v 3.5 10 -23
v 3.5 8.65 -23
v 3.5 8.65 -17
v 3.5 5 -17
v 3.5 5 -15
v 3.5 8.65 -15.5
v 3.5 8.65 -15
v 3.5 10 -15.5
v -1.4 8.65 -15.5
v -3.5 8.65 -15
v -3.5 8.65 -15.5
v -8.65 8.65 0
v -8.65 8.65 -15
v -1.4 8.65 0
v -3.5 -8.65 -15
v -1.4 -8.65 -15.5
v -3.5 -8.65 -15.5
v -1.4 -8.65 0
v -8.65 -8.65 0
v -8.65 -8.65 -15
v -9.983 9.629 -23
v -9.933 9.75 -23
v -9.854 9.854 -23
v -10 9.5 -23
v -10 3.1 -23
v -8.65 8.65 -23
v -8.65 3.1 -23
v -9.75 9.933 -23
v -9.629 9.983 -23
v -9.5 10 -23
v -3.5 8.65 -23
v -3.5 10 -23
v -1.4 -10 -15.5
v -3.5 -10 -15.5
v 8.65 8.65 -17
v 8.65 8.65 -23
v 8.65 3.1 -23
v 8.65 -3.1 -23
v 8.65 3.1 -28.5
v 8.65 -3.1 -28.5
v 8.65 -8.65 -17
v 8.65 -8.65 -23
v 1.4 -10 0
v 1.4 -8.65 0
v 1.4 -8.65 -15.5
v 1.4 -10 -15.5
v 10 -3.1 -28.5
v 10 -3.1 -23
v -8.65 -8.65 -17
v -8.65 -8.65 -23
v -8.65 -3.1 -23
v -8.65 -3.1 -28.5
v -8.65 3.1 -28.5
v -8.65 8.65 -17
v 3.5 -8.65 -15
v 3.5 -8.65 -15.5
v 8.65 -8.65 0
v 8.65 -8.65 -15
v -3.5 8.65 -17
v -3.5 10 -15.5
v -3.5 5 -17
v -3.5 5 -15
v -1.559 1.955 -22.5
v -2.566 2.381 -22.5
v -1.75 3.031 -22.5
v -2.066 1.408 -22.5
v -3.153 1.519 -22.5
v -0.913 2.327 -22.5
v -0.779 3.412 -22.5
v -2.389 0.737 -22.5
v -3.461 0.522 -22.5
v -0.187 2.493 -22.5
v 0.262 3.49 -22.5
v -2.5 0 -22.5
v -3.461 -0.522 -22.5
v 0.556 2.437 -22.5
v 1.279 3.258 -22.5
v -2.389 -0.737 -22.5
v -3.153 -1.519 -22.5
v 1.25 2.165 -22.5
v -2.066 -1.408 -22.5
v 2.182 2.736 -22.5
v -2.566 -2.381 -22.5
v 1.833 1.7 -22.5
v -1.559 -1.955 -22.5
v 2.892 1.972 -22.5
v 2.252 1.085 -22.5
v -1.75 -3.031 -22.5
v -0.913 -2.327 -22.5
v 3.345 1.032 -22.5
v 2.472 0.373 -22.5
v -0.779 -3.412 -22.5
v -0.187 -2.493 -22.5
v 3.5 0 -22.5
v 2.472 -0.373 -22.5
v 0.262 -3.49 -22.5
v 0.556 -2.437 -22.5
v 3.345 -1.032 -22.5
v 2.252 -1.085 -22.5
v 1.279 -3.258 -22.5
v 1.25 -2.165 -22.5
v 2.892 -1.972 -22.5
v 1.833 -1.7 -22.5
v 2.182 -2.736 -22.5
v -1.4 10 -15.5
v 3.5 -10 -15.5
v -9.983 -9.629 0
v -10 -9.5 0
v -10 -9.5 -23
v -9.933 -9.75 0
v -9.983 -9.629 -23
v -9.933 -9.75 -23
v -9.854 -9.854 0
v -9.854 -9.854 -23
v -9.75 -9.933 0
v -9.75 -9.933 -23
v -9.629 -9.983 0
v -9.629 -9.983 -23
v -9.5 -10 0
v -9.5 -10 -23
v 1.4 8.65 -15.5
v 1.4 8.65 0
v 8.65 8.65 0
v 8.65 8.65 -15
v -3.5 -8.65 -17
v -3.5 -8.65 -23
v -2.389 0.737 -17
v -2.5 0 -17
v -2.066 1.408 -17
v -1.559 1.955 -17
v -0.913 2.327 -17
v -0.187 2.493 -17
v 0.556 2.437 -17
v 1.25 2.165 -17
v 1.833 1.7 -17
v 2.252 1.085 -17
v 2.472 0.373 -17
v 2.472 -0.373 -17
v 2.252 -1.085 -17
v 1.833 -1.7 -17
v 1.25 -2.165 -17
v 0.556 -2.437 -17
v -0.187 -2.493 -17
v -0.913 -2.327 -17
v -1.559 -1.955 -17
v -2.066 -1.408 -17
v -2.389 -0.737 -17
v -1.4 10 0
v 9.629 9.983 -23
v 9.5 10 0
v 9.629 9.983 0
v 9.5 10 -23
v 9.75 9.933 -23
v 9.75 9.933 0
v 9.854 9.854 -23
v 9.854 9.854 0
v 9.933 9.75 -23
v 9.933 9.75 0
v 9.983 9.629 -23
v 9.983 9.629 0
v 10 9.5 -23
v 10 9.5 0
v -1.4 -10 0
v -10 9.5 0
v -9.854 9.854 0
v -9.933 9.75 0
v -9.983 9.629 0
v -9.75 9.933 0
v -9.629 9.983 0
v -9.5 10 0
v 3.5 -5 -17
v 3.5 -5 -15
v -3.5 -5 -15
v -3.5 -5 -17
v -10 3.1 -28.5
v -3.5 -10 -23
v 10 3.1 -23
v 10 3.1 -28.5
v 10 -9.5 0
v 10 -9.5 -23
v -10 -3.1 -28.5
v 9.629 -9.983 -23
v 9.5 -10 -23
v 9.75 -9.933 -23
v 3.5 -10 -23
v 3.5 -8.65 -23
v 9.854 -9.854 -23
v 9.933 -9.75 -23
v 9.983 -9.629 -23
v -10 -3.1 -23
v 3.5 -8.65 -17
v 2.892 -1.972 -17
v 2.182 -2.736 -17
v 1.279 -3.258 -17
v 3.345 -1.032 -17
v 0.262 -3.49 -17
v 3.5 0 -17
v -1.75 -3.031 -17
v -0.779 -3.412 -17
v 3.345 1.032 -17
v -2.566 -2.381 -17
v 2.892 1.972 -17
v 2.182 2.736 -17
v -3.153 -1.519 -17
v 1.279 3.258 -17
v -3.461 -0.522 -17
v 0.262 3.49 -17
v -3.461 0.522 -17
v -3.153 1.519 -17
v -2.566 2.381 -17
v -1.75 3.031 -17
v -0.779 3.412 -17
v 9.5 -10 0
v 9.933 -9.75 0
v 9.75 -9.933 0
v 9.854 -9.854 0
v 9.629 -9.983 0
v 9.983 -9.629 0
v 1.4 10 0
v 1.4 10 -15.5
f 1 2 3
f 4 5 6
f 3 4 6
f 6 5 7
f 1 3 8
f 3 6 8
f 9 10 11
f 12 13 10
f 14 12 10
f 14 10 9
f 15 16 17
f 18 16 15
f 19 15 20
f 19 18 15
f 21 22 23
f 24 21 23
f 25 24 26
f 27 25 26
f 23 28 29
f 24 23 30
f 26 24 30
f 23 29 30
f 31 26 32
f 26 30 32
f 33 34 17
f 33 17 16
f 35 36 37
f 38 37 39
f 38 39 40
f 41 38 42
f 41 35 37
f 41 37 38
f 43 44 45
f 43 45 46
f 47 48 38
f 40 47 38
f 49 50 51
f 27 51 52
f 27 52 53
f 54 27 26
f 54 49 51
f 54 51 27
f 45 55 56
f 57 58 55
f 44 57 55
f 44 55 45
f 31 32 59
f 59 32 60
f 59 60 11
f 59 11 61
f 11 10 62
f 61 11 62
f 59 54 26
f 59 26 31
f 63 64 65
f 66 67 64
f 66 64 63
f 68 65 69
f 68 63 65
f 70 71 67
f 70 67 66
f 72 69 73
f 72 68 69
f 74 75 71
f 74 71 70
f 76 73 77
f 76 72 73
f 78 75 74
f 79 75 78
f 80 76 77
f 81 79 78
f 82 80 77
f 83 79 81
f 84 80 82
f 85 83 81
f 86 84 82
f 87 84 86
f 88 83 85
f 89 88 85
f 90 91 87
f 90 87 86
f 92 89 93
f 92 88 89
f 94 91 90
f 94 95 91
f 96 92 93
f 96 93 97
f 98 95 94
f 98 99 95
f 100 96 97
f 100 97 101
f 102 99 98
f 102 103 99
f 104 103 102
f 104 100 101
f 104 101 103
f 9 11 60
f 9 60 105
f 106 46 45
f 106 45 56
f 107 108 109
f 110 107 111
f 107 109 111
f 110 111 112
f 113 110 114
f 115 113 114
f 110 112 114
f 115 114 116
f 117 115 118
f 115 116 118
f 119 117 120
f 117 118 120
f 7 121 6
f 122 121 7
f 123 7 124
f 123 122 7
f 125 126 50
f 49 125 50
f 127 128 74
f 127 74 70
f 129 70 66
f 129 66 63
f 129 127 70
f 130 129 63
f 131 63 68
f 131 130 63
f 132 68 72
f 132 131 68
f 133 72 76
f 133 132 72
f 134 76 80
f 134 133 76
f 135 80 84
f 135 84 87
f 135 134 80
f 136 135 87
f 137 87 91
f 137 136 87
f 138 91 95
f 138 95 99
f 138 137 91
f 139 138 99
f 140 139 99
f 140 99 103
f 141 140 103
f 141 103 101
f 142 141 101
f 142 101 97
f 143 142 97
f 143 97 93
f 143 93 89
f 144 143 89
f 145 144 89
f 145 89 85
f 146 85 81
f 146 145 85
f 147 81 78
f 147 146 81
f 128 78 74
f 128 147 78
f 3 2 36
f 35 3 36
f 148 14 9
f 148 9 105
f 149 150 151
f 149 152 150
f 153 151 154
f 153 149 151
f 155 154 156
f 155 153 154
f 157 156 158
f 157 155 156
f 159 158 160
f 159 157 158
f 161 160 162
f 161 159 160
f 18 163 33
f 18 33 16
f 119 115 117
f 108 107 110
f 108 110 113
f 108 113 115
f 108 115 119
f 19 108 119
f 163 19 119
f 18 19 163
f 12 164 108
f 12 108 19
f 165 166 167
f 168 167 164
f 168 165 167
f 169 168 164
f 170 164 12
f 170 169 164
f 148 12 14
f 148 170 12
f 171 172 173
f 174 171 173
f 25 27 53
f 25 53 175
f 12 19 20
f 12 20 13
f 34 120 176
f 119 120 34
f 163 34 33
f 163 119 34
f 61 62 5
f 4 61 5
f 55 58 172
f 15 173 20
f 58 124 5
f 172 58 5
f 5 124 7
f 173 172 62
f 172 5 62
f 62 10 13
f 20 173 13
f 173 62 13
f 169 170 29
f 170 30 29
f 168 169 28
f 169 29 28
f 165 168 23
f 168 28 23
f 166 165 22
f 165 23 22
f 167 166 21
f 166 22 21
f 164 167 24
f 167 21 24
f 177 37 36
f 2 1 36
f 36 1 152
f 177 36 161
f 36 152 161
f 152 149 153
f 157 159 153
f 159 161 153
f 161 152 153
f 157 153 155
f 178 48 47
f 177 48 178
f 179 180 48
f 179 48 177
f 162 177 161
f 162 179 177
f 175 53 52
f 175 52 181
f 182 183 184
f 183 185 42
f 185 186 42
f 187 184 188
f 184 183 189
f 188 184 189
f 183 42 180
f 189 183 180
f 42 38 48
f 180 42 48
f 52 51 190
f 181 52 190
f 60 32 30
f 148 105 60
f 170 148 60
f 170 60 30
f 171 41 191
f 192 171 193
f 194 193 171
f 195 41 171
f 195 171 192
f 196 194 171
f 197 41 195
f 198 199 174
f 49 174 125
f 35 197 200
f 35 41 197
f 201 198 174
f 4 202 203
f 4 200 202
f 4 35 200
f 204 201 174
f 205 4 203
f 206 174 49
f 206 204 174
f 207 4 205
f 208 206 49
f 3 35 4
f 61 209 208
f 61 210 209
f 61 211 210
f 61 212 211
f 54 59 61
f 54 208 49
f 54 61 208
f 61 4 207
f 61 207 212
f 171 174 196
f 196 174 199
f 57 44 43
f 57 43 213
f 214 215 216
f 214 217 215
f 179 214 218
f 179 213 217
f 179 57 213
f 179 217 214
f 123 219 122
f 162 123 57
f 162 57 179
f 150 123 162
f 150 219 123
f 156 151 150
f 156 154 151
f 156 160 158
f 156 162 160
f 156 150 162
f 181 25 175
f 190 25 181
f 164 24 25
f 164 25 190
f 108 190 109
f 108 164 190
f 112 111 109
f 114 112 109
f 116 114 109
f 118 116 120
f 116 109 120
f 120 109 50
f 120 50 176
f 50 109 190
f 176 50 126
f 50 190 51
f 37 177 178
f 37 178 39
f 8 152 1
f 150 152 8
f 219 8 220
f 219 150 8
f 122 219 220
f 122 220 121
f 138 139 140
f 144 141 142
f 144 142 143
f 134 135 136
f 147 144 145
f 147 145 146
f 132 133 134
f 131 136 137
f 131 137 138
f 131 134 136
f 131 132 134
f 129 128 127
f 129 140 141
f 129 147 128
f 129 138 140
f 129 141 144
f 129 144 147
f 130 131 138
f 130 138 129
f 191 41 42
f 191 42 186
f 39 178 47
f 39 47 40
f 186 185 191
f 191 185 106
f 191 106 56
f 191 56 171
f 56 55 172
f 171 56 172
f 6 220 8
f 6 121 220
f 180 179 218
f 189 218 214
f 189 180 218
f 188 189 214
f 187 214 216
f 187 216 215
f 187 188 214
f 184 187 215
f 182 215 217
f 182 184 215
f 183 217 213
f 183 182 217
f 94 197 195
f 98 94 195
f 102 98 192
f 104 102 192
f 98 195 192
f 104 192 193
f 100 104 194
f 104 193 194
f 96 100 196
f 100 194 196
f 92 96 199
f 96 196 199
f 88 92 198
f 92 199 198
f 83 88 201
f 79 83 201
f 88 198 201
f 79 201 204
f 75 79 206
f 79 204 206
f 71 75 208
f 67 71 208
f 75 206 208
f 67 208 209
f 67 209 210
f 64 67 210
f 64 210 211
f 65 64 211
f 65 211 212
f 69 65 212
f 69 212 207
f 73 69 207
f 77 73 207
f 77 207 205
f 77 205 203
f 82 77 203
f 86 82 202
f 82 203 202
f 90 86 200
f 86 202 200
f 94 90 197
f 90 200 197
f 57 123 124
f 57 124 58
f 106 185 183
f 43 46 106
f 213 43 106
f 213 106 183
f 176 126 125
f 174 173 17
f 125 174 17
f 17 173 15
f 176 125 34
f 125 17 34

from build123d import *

# Parameters (mm, degrees)
BOSS_EXTRUDE1_DEPTH      = 23
BOSS_EXTRUDE1_2_DEPTH    = 23
SKETCH2_W                = 7
SKETCH2_H                = 7.5
CUT_EXTRUDE1_DEPTH       = 22
BOSS_EXTRUDE2_DEPTH      = 1.5
BOSS_EXTRUDE2_DEPTH_BACK = 0.5
FILLET1_R                = 0.5
SKETCH4_R                = 3.5
SKETCH4_R_2              = 2.5
BOSS_EXTRUDE3_DEPTH      = 5.5
SKETCH5_W                = 1.35
SKETCH5_H                = 6.2
BOSS_EXTRUDE4_DEPTH      = 5.5


with BuildPart() as part:
    # Sketch1 → Boss-Extrude1 (new body)
    with BuildSketch(Plane.XY):
        Polygon((-8.65, 8.65), (-1.4, 8.65), (-1.4, 10), (-10, 10), (-10, -10), (-1.4, -10), (-1.4, -8.65), (-8.65, -8.65), align=None)
    extrude(amount=-BOSS_EXTRUDE1_DEPTH)


with BuildPart() as body_2:
    # Sketch1 → Boss-Extrude1 2 (new body)
    with BuildSketch(Plane.XY):
        Polygon((10, -10), (10, 10), (1.4, 10), (1.4, 8.65), (8.65, 8.65), (8.65, -8.65), (1.4, -8.65), (1.4, -10), align=None)
    extrude(amount=-BOSS_EXTRUDE1_2_DEPTH)


with BuildPart() as cut_extrude1_tool:
    # Sketch2 → Cut-Extrude1 (new body)
    with BuildSketch(Plane.XZ.offset(10)):
        with Locations((0, -19.25)):
            Rectangle(SKETCH2_W, SKETCH2_H)
    extrude(amount=-CUT_EXTRUDE1_DEPTH)


with BuildPart() as part_1:
    add(part.part)

    # Cut-Extrude1: cut by cut_extrude1_tool
    add(cut_extrude1_tool.part, mode=Mode.SUBTRACT)



with BuildPart() as body_2_1:
    add(body_2.part)

    # Cut-Extrude1: cut by cut_extrude1_tool
    add(cut_extrude1_tool.part, mode=Mode.SUBTRACT)


with BuildPart() as part_2:
    add(part_1.part)

    add(body_2_1.part)  # Boss-Extrude2 merges body 2
    # Sketch3 → Boss-Extrude2 (add, two sides: drawn at the far end of the back side and taken through both)
    with BuildSketch(Plane(origin=(0, 0, -15.5), x_dir=(-1, 0, 0), z_dir=(0, 0, -1)).offset(-BOSS_EXTRUDE2_DEPTH_BACK)):
        Polygon((8.65, 8.65), (3.5, 8.65), (3.5, 5), (-3.5, 5), (-3.5, 8.65), (-8.65, 8.65), (-8.65, -8.65), (-3.5, -8.65), (-3.5, -5), (3.5, -5), (3.5, -8.65), (8.65, -8.65), align=None)
    extrude(amount=BOSS_EXTRUDE2_DEPTH + BOSS_EXTRUDE2_DEPTH_BACK)

    # Fillet1
    fillet1_edges = [part_2.edges().sort_by_distance(p)[0] for p in [
        (10, 10, -11.5),
        (10, -10, -11.5),
        (-10, -10, -11.5),
        (-10, 10, -11.5),
    ]]
    fillet(fillet1_edges, radius=FILLET1_R)

    # Sketch4 → Boss-Extrude3 (add)
    with BuildSketch(Plane(origin=(0, 0, -17), x_dir=(-1, 0, 0), z_dir=(0, 0, -1))):
        with Locations(Location((0, 0, 0), (0, 0, 180))):
            Circle(SKETCH4_R)
        Circle(SKETCH4_R_2, mode=Mode.SUBTRACT)
    extrude(amount=BOSS_EXTRUDE3_DEPTH)

    # Sketch5 → Boss-Extrude4 (add)
    with BuildSketch(Plane(origin=(0, 0, -23), x_dir=(-1, 0, 0), z_dir=(0, 0, -1))):
        with Locations((-9.325, 0)):
            Rectangle(SKETCH5_W, SKETCH5_H)
        with Locations((9.325, 0)):
            Rectangle(SKETCH5_W, SKETCH5_H)
    extrude(amount=BOSS_EXTRUDE4_DEPTH)


solid = part_2.part
